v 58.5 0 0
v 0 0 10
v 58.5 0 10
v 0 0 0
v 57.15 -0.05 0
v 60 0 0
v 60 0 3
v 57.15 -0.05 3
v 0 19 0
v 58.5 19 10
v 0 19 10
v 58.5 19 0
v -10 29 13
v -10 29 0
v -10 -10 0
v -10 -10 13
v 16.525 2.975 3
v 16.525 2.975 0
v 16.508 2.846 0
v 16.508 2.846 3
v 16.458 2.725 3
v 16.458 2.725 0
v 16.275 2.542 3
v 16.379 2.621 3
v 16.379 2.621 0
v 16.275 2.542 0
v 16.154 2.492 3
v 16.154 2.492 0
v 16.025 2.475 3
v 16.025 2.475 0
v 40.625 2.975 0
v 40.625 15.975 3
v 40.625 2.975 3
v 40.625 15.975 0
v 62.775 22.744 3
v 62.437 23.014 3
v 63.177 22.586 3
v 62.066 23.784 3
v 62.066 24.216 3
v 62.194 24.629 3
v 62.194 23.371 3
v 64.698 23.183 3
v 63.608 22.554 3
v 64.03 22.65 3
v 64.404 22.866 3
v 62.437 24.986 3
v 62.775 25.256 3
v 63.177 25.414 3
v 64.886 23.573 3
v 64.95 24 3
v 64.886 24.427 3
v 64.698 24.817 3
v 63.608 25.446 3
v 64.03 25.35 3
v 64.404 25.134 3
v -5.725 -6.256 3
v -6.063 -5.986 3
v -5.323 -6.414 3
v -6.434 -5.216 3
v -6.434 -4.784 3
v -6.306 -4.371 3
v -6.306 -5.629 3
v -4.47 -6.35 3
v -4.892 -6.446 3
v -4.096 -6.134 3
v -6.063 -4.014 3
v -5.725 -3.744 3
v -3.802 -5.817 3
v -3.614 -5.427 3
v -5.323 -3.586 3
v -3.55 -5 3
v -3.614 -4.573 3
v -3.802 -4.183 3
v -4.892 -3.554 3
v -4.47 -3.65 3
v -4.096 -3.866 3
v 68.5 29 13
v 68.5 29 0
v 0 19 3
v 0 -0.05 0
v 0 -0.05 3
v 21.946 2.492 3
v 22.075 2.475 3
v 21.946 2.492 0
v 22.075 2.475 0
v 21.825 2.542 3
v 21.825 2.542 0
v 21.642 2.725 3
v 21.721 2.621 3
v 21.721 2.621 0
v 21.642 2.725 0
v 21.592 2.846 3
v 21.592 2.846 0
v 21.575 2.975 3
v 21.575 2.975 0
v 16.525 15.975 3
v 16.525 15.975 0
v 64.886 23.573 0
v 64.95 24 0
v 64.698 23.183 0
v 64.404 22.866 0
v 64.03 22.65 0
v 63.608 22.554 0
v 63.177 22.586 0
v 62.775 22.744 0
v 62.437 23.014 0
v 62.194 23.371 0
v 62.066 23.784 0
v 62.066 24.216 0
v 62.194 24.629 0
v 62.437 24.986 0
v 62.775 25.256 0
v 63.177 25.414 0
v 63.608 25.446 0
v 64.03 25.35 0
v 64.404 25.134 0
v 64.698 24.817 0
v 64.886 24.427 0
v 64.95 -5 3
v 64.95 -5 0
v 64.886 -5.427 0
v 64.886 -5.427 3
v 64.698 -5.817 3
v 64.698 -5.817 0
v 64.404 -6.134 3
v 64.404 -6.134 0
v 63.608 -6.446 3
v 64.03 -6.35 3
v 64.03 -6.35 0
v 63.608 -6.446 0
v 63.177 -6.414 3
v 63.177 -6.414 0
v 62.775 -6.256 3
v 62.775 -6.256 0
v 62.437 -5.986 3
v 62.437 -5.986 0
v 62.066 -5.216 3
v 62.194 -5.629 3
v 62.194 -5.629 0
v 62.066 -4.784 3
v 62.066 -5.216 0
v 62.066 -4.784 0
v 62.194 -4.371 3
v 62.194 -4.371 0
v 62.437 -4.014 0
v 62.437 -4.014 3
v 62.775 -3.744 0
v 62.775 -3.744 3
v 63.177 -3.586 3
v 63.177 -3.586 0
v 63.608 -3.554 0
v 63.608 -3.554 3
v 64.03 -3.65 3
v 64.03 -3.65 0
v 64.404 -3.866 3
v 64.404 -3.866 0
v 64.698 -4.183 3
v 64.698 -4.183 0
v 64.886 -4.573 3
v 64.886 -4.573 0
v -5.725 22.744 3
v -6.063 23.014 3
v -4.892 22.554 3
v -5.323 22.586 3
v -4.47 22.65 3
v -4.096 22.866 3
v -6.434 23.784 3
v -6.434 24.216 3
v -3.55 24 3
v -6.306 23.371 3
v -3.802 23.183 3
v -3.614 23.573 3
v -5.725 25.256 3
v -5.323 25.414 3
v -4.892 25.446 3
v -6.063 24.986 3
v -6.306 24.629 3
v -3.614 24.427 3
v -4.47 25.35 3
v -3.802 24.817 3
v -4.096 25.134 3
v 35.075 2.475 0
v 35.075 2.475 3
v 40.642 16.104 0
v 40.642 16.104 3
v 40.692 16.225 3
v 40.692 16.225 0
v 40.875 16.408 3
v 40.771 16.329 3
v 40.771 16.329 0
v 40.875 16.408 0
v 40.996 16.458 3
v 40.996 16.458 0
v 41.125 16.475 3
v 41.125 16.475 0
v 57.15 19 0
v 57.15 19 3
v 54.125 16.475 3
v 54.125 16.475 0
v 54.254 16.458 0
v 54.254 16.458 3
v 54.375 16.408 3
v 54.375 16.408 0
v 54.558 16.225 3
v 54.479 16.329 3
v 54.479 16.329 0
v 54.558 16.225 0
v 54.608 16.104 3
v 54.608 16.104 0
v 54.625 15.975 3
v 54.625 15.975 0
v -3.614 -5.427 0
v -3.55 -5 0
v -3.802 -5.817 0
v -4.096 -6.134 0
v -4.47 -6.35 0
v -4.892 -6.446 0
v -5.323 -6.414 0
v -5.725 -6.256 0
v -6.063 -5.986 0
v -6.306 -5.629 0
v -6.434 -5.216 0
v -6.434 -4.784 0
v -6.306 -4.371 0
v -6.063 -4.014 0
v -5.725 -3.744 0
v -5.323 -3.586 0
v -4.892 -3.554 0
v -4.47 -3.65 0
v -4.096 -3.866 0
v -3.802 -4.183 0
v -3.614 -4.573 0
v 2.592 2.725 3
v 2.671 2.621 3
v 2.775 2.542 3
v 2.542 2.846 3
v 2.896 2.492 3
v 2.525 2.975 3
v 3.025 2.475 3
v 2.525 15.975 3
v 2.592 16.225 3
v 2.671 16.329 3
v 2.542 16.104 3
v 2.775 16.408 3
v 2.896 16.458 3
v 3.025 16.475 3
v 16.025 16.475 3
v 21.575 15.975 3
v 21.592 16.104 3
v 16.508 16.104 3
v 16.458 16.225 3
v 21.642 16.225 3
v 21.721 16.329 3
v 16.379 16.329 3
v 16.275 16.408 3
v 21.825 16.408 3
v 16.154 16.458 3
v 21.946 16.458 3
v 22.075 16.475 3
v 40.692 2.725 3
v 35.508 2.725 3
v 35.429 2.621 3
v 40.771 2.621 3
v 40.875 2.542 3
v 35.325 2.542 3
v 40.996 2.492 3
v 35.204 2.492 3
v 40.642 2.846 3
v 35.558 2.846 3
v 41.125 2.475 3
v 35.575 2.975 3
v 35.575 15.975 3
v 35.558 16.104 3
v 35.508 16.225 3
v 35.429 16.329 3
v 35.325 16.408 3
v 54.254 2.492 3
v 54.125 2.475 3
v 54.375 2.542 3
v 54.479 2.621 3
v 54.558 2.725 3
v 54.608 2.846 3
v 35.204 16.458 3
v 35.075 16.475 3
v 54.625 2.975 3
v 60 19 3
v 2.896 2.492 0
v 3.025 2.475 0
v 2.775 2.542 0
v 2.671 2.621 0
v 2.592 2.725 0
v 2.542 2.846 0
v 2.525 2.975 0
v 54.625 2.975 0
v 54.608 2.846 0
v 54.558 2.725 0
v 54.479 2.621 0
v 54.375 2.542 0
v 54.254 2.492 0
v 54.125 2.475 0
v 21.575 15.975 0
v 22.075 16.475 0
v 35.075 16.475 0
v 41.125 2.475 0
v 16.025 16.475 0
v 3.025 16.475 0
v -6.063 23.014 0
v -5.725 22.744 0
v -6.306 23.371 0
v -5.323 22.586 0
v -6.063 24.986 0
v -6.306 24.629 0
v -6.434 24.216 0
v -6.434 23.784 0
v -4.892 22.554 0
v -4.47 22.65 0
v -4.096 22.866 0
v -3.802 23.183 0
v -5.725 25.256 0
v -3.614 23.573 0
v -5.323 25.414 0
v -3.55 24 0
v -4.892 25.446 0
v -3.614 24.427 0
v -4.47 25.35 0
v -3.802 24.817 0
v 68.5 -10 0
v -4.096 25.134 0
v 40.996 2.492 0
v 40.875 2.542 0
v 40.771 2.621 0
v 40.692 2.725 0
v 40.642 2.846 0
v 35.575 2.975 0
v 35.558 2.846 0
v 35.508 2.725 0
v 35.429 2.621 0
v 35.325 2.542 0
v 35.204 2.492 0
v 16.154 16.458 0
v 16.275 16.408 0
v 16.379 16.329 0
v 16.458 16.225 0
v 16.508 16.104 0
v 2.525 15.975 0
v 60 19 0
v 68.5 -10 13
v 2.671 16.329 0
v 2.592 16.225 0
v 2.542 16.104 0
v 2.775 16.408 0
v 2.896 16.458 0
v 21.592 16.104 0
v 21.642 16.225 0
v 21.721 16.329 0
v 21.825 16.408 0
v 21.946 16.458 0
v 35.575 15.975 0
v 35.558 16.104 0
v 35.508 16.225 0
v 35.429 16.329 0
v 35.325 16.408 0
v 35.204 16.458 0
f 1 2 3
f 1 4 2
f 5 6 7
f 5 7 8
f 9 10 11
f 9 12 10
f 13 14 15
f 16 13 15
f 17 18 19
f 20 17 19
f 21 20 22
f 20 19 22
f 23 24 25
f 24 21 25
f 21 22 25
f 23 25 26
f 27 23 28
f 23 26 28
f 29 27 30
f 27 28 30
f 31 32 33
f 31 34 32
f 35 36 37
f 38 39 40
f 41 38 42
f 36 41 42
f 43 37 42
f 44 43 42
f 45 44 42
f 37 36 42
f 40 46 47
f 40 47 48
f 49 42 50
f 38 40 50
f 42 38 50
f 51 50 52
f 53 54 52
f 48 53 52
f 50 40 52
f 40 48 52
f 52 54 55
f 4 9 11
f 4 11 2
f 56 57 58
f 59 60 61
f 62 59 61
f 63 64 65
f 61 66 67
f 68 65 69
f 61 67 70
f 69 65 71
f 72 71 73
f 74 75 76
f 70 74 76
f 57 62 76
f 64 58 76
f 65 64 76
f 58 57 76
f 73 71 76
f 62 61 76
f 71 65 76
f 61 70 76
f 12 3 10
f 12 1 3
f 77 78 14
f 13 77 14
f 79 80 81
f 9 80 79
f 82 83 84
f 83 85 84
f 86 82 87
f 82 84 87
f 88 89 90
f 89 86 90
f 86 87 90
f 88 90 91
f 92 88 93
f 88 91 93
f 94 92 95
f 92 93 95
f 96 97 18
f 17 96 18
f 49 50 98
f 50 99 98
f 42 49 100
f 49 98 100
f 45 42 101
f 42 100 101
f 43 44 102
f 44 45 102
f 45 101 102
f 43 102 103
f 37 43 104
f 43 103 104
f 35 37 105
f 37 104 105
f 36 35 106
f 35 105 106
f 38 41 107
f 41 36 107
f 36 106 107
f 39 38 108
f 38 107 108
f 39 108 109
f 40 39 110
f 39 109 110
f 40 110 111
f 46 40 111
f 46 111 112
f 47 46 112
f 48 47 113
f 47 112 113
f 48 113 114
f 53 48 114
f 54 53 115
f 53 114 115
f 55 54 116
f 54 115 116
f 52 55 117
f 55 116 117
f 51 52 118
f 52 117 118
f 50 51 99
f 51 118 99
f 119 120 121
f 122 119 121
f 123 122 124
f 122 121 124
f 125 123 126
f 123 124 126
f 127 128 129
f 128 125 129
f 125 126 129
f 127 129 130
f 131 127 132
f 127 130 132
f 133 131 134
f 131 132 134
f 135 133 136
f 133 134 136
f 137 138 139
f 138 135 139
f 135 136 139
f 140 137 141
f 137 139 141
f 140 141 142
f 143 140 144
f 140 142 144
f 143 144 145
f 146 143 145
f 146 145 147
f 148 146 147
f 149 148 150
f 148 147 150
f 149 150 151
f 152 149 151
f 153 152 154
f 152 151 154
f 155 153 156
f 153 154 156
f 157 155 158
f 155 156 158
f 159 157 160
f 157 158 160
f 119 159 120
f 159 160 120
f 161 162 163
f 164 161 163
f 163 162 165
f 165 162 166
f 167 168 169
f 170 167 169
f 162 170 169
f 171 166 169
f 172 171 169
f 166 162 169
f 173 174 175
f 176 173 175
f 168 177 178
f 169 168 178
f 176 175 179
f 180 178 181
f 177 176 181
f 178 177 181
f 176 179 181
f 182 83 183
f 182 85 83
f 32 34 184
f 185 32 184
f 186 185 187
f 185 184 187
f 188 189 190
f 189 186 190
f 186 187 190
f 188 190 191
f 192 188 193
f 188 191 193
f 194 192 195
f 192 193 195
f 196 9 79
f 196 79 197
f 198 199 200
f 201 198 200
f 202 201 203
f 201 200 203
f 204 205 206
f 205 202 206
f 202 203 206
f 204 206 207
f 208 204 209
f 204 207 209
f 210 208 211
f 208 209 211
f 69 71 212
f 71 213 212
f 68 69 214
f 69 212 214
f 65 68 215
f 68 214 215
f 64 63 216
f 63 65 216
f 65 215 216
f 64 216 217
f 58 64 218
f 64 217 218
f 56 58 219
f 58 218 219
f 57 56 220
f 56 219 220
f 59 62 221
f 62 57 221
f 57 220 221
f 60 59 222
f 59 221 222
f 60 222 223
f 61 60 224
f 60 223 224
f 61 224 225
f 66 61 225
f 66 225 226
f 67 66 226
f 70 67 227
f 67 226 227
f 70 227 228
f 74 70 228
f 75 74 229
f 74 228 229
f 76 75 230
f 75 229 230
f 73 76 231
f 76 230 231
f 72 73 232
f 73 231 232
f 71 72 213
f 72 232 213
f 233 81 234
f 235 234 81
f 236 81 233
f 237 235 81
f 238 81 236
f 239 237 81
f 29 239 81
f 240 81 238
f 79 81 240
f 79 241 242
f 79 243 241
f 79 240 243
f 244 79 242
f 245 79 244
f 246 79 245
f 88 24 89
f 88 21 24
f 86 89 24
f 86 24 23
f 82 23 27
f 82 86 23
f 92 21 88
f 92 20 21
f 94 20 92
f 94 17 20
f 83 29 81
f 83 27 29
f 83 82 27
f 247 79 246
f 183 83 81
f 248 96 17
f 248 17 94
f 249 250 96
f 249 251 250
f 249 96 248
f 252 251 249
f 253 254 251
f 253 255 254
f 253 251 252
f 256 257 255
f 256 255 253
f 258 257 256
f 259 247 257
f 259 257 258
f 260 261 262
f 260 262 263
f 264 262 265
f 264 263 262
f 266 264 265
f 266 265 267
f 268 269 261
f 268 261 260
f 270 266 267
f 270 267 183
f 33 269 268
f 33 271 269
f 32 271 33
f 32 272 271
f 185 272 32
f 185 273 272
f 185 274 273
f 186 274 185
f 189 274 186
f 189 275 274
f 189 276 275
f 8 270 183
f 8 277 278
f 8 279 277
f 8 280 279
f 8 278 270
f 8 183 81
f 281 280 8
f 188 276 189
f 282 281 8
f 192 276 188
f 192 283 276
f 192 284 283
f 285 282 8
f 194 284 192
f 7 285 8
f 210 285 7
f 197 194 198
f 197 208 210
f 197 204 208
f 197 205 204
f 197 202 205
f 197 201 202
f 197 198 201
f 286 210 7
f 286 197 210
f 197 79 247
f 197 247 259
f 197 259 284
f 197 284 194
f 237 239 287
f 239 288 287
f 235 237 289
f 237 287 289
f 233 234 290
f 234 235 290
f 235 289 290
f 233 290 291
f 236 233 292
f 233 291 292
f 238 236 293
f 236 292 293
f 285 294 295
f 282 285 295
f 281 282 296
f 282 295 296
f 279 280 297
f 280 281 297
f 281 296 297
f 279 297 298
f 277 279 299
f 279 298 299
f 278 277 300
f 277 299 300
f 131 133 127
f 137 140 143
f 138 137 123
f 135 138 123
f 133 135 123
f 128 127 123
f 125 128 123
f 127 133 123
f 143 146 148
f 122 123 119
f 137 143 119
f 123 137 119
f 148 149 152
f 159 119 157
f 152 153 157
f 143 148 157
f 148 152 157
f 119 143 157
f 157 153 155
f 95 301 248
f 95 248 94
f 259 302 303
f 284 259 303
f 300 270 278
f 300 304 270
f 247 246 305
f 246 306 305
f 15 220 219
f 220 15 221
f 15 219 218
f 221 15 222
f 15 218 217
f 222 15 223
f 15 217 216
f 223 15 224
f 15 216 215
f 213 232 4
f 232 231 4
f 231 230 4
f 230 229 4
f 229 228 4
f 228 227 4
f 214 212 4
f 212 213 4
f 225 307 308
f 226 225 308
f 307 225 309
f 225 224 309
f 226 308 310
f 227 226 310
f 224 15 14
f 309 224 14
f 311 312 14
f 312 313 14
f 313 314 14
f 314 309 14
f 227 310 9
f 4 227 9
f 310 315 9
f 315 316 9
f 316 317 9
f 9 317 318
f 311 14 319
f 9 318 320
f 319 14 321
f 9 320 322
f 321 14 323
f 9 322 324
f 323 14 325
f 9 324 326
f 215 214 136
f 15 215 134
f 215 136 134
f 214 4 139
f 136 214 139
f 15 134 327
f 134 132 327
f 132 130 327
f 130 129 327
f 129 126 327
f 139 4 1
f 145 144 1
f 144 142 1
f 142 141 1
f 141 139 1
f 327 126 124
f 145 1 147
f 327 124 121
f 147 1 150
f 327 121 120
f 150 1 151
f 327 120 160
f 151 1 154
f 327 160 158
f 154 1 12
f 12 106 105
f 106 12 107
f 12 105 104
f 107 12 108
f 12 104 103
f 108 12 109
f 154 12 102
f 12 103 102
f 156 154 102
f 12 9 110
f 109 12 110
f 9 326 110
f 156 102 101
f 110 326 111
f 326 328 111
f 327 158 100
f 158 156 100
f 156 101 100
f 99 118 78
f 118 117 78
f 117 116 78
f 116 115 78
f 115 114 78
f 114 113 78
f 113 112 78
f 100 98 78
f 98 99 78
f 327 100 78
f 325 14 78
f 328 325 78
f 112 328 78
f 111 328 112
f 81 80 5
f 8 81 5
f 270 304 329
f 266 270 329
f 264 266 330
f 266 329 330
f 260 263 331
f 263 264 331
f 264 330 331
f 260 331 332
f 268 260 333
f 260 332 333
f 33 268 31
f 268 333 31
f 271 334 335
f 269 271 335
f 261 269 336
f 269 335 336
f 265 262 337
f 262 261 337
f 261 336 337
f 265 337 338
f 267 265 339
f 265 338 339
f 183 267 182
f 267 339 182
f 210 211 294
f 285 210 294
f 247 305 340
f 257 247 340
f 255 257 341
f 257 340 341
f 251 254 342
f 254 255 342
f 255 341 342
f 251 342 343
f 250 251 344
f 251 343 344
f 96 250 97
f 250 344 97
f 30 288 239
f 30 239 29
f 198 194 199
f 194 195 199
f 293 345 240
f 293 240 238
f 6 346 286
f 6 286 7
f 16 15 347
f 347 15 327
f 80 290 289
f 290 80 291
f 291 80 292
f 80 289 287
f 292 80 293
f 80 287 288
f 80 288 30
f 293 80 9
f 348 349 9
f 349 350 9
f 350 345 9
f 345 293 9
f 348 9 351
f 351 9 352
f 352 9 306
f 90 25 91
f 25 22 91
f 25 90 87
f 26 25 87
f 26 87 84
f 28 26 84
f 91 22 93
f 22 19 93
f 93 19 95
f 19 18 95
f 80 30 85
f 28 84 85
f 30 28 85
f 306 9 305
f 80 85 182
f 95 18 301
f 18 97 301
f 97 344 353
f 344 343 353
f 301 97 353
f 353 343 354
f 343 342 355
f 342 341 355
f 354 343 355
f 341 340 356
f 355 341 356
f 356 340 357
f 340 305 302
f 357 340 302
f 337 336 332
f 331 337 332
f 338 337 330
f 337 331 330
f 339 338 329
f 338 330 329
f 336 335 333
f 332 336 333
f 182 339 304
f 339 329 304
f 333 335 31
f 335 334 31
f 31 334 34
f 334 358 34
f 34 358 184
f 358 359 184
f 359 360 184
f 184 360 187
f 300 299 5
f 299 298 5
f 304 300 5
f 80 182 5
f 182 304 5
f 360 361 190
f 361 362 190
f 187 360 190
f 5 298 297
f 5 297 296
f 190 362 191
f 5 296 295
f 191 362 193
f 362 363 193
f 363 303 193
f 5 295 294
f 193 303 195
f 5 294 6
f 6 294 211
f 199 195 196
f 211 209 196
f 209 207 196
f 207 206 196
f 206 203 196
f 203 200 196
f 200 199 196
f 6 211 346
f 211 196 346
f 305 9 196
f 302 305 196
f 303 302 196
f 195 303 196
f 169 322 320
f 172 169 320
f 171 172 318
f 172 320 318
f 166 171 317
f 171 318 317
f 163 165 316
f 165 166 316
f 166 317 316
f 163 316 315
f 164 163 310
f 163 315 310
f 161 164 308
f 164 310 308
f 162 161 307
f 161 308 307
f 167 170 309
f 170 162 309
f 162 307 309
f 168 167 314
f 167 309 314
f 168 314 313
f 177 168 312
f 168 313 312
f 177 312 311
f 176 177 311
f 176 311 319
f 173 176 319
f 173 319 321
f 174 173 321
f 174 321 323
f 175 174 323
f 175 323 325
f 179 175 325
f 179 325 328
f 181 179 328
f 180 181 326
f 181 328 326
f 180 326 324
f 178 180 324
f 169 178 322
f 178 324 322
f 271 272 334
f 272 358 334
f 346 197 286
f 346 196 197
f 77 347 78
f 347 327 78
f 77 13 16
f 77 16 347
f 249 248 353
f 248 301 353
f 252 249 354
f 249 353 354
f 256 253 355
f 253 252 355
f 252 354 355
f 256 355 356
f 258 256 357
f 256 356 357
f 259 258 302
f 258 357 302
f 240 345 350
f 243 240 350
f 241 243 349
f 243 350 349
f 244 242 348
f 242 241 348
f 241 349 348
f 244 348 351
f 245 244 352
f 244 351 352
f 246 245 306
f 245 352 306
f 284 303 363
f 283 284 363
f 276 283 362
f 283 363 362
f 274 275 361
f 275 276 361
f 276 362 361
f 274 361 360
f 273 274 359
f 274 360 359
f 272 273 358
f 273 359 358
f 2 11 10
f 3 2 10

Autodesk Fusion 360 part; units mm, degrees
sketch "Sketch3" plane through (0, 0, 0) normal (0, 0, 1) x (1, 0, 0)
  line L0 (0, 0) -> (58.5, 0)
  line L1 (58.5, 0) -> (58.5, 19)
  line L2 (58.5, 19) -> (0, 19)
  line L3 (0, 19) -> (0, 0)
  dimension "d1" = 58.5
  dimension "d2" = 19
sketch "Sketch6" plane through (0, 0, 0) normal (0, 0, 1) x (1, 0, 0)
  line L0 (-10, -10) -> (68.5, -10)
  line L1 (68.5, -10) -> (68.5, 29)
  line L2 (68.5, 29) -> (-10, 29)
  line L3 (-10, 29) -> (-10, -10)
  dimension "d5" = 78.5
  dimension "d6" = 39
sketch "Sketch8" plane through (0, 0, 0) normal (0, 0, 1) x (1, 0, 0)
  circle A0 centre (-5, 24) radius 1.45
  circle A1 centre (-5, -5) radius 1.45
  circle A2 centre (63.5, -5) radius 1.45
  circle A3 centre (63.5, 24) radius 1.45
  dimension "d7" = 2.9
  dimension "d8" = 2.9
  dimension "d9" = 2.9
  dimension "d10" = 2.9
extrude "Extrude1" add sketch "Sketch6" along normal blind 13 makes body 1
extrude "Extrude2" cut sketch "Sketch3" along normal blind 10 bodies 1
extrude "Extrude3" cut sketch "Sketch8" along normal blind 3 bodies 1
sketch "plate-2026-09-07T15_19_25.806Z" plane through (0, 0, 0) normal (0, 0, 1) x (1, 0, 0)
  line L0 (3.025, 16.475) -> (16.025, 16.475)
  line L1 (3.025, 2.475) -> (16.025, 2.475)
  line L2 (2.525, 15.975) -> (2.525, 2.975)
  line L3 (16.525, 15.975) -> (16.525, 2.975)
  arc A0 (3.025, 16.475) -> (2.525, 15.975) centre (3.025, 15.975) ccw
  arc A1 (16.525, 15.975) -> (16.025, 16.475) centre (16.025, 15.975) ccw
  arc A2 (2.525, 2.975) -> (3.025, 2.475) centre (3.025, 2.975) ccw
  arc A3 (16.025, 2.475) -> (16.525, 2.975) centre (16.025, 2.975) ccw
  line L4 (22.075, 16.475) -> (35.075, 16.475)
  line L5 (22.075, 2.475) -> (35.075, 2.475)
  line L6 (21.575, 15.975) -> (21.575, 2.975)
  line L7 (35.575, 15.975) -> (35.575, 2.975)
  arc A4 (22.075, 16.475) -> (21.575, 15.975) centre (22.075, 15.975) ccw
  arc A5 (35.575, 15.975) -> (35.075, 16.475) centre (35.075, 15.975) ccw
  arc A6 (21.575, 2.975) -> (22.075, 2.475) centre (22.075, 2.975) ccw
  arc A7 (35.075, 2.475) -> (35.575, 2.975) centre (35.075, 2.975) ccw
  line L8 (41.125, 16.475) -> (54.125, 16.475)
  line L9 (41.125, 2.475) -> (54.125, 2.475)
  line L10 (40.625, 15.975) -> (40.625, 2.975)
  line L11 (54.625, 15.975) -> (54.625, 2.975)
  arc A8 (41.125, 16.475) -> (40.625, 15.975) centre (41.125, 15.975) ccw
  arc A9 (54.625, 15.975) -> (54.125, 16.475) centre (54.125, 15.975) ccw
  arc A10 (40.625, 2.975) -> (41.125, 2.475) centre (41.125, 2.975) ccw
  arc A11 (54.125, 2.475) -> (54.625, 2.975) centre (54.125, 2.975) ccw
  line L12 (0, -0.05) -> (57.15, -0.05)
  line L13 (0, 19) -> (57.15, 19)
  line L14 (0, -0.05) -> (0, 19)
  line L15 (57.15, 19) -> (60, 19)
  line L16 (60, 19) -> (60, 0)
  line L17 (60, 0) -> (57.15, -0.05)
extrude "Extrude4" add sketch "plate-2026-09-07T15_19_25.806Z" along normal blind 3 separate body makes body 2
sketch "Sketch10" plane through (0, 0, 3) normal (0, 0, -1) x (1, 0, 0)
  circle A0 centre (63.5, 5) radius 1.45
sketch "Sketch1" plane through (0, 0, 0) normal (0, 0, 1) x (1, 0, 0)
sketch "Sketch2" plane through (0, 0, 0) normal (0, 0, 1) x (1, 0, 0)
